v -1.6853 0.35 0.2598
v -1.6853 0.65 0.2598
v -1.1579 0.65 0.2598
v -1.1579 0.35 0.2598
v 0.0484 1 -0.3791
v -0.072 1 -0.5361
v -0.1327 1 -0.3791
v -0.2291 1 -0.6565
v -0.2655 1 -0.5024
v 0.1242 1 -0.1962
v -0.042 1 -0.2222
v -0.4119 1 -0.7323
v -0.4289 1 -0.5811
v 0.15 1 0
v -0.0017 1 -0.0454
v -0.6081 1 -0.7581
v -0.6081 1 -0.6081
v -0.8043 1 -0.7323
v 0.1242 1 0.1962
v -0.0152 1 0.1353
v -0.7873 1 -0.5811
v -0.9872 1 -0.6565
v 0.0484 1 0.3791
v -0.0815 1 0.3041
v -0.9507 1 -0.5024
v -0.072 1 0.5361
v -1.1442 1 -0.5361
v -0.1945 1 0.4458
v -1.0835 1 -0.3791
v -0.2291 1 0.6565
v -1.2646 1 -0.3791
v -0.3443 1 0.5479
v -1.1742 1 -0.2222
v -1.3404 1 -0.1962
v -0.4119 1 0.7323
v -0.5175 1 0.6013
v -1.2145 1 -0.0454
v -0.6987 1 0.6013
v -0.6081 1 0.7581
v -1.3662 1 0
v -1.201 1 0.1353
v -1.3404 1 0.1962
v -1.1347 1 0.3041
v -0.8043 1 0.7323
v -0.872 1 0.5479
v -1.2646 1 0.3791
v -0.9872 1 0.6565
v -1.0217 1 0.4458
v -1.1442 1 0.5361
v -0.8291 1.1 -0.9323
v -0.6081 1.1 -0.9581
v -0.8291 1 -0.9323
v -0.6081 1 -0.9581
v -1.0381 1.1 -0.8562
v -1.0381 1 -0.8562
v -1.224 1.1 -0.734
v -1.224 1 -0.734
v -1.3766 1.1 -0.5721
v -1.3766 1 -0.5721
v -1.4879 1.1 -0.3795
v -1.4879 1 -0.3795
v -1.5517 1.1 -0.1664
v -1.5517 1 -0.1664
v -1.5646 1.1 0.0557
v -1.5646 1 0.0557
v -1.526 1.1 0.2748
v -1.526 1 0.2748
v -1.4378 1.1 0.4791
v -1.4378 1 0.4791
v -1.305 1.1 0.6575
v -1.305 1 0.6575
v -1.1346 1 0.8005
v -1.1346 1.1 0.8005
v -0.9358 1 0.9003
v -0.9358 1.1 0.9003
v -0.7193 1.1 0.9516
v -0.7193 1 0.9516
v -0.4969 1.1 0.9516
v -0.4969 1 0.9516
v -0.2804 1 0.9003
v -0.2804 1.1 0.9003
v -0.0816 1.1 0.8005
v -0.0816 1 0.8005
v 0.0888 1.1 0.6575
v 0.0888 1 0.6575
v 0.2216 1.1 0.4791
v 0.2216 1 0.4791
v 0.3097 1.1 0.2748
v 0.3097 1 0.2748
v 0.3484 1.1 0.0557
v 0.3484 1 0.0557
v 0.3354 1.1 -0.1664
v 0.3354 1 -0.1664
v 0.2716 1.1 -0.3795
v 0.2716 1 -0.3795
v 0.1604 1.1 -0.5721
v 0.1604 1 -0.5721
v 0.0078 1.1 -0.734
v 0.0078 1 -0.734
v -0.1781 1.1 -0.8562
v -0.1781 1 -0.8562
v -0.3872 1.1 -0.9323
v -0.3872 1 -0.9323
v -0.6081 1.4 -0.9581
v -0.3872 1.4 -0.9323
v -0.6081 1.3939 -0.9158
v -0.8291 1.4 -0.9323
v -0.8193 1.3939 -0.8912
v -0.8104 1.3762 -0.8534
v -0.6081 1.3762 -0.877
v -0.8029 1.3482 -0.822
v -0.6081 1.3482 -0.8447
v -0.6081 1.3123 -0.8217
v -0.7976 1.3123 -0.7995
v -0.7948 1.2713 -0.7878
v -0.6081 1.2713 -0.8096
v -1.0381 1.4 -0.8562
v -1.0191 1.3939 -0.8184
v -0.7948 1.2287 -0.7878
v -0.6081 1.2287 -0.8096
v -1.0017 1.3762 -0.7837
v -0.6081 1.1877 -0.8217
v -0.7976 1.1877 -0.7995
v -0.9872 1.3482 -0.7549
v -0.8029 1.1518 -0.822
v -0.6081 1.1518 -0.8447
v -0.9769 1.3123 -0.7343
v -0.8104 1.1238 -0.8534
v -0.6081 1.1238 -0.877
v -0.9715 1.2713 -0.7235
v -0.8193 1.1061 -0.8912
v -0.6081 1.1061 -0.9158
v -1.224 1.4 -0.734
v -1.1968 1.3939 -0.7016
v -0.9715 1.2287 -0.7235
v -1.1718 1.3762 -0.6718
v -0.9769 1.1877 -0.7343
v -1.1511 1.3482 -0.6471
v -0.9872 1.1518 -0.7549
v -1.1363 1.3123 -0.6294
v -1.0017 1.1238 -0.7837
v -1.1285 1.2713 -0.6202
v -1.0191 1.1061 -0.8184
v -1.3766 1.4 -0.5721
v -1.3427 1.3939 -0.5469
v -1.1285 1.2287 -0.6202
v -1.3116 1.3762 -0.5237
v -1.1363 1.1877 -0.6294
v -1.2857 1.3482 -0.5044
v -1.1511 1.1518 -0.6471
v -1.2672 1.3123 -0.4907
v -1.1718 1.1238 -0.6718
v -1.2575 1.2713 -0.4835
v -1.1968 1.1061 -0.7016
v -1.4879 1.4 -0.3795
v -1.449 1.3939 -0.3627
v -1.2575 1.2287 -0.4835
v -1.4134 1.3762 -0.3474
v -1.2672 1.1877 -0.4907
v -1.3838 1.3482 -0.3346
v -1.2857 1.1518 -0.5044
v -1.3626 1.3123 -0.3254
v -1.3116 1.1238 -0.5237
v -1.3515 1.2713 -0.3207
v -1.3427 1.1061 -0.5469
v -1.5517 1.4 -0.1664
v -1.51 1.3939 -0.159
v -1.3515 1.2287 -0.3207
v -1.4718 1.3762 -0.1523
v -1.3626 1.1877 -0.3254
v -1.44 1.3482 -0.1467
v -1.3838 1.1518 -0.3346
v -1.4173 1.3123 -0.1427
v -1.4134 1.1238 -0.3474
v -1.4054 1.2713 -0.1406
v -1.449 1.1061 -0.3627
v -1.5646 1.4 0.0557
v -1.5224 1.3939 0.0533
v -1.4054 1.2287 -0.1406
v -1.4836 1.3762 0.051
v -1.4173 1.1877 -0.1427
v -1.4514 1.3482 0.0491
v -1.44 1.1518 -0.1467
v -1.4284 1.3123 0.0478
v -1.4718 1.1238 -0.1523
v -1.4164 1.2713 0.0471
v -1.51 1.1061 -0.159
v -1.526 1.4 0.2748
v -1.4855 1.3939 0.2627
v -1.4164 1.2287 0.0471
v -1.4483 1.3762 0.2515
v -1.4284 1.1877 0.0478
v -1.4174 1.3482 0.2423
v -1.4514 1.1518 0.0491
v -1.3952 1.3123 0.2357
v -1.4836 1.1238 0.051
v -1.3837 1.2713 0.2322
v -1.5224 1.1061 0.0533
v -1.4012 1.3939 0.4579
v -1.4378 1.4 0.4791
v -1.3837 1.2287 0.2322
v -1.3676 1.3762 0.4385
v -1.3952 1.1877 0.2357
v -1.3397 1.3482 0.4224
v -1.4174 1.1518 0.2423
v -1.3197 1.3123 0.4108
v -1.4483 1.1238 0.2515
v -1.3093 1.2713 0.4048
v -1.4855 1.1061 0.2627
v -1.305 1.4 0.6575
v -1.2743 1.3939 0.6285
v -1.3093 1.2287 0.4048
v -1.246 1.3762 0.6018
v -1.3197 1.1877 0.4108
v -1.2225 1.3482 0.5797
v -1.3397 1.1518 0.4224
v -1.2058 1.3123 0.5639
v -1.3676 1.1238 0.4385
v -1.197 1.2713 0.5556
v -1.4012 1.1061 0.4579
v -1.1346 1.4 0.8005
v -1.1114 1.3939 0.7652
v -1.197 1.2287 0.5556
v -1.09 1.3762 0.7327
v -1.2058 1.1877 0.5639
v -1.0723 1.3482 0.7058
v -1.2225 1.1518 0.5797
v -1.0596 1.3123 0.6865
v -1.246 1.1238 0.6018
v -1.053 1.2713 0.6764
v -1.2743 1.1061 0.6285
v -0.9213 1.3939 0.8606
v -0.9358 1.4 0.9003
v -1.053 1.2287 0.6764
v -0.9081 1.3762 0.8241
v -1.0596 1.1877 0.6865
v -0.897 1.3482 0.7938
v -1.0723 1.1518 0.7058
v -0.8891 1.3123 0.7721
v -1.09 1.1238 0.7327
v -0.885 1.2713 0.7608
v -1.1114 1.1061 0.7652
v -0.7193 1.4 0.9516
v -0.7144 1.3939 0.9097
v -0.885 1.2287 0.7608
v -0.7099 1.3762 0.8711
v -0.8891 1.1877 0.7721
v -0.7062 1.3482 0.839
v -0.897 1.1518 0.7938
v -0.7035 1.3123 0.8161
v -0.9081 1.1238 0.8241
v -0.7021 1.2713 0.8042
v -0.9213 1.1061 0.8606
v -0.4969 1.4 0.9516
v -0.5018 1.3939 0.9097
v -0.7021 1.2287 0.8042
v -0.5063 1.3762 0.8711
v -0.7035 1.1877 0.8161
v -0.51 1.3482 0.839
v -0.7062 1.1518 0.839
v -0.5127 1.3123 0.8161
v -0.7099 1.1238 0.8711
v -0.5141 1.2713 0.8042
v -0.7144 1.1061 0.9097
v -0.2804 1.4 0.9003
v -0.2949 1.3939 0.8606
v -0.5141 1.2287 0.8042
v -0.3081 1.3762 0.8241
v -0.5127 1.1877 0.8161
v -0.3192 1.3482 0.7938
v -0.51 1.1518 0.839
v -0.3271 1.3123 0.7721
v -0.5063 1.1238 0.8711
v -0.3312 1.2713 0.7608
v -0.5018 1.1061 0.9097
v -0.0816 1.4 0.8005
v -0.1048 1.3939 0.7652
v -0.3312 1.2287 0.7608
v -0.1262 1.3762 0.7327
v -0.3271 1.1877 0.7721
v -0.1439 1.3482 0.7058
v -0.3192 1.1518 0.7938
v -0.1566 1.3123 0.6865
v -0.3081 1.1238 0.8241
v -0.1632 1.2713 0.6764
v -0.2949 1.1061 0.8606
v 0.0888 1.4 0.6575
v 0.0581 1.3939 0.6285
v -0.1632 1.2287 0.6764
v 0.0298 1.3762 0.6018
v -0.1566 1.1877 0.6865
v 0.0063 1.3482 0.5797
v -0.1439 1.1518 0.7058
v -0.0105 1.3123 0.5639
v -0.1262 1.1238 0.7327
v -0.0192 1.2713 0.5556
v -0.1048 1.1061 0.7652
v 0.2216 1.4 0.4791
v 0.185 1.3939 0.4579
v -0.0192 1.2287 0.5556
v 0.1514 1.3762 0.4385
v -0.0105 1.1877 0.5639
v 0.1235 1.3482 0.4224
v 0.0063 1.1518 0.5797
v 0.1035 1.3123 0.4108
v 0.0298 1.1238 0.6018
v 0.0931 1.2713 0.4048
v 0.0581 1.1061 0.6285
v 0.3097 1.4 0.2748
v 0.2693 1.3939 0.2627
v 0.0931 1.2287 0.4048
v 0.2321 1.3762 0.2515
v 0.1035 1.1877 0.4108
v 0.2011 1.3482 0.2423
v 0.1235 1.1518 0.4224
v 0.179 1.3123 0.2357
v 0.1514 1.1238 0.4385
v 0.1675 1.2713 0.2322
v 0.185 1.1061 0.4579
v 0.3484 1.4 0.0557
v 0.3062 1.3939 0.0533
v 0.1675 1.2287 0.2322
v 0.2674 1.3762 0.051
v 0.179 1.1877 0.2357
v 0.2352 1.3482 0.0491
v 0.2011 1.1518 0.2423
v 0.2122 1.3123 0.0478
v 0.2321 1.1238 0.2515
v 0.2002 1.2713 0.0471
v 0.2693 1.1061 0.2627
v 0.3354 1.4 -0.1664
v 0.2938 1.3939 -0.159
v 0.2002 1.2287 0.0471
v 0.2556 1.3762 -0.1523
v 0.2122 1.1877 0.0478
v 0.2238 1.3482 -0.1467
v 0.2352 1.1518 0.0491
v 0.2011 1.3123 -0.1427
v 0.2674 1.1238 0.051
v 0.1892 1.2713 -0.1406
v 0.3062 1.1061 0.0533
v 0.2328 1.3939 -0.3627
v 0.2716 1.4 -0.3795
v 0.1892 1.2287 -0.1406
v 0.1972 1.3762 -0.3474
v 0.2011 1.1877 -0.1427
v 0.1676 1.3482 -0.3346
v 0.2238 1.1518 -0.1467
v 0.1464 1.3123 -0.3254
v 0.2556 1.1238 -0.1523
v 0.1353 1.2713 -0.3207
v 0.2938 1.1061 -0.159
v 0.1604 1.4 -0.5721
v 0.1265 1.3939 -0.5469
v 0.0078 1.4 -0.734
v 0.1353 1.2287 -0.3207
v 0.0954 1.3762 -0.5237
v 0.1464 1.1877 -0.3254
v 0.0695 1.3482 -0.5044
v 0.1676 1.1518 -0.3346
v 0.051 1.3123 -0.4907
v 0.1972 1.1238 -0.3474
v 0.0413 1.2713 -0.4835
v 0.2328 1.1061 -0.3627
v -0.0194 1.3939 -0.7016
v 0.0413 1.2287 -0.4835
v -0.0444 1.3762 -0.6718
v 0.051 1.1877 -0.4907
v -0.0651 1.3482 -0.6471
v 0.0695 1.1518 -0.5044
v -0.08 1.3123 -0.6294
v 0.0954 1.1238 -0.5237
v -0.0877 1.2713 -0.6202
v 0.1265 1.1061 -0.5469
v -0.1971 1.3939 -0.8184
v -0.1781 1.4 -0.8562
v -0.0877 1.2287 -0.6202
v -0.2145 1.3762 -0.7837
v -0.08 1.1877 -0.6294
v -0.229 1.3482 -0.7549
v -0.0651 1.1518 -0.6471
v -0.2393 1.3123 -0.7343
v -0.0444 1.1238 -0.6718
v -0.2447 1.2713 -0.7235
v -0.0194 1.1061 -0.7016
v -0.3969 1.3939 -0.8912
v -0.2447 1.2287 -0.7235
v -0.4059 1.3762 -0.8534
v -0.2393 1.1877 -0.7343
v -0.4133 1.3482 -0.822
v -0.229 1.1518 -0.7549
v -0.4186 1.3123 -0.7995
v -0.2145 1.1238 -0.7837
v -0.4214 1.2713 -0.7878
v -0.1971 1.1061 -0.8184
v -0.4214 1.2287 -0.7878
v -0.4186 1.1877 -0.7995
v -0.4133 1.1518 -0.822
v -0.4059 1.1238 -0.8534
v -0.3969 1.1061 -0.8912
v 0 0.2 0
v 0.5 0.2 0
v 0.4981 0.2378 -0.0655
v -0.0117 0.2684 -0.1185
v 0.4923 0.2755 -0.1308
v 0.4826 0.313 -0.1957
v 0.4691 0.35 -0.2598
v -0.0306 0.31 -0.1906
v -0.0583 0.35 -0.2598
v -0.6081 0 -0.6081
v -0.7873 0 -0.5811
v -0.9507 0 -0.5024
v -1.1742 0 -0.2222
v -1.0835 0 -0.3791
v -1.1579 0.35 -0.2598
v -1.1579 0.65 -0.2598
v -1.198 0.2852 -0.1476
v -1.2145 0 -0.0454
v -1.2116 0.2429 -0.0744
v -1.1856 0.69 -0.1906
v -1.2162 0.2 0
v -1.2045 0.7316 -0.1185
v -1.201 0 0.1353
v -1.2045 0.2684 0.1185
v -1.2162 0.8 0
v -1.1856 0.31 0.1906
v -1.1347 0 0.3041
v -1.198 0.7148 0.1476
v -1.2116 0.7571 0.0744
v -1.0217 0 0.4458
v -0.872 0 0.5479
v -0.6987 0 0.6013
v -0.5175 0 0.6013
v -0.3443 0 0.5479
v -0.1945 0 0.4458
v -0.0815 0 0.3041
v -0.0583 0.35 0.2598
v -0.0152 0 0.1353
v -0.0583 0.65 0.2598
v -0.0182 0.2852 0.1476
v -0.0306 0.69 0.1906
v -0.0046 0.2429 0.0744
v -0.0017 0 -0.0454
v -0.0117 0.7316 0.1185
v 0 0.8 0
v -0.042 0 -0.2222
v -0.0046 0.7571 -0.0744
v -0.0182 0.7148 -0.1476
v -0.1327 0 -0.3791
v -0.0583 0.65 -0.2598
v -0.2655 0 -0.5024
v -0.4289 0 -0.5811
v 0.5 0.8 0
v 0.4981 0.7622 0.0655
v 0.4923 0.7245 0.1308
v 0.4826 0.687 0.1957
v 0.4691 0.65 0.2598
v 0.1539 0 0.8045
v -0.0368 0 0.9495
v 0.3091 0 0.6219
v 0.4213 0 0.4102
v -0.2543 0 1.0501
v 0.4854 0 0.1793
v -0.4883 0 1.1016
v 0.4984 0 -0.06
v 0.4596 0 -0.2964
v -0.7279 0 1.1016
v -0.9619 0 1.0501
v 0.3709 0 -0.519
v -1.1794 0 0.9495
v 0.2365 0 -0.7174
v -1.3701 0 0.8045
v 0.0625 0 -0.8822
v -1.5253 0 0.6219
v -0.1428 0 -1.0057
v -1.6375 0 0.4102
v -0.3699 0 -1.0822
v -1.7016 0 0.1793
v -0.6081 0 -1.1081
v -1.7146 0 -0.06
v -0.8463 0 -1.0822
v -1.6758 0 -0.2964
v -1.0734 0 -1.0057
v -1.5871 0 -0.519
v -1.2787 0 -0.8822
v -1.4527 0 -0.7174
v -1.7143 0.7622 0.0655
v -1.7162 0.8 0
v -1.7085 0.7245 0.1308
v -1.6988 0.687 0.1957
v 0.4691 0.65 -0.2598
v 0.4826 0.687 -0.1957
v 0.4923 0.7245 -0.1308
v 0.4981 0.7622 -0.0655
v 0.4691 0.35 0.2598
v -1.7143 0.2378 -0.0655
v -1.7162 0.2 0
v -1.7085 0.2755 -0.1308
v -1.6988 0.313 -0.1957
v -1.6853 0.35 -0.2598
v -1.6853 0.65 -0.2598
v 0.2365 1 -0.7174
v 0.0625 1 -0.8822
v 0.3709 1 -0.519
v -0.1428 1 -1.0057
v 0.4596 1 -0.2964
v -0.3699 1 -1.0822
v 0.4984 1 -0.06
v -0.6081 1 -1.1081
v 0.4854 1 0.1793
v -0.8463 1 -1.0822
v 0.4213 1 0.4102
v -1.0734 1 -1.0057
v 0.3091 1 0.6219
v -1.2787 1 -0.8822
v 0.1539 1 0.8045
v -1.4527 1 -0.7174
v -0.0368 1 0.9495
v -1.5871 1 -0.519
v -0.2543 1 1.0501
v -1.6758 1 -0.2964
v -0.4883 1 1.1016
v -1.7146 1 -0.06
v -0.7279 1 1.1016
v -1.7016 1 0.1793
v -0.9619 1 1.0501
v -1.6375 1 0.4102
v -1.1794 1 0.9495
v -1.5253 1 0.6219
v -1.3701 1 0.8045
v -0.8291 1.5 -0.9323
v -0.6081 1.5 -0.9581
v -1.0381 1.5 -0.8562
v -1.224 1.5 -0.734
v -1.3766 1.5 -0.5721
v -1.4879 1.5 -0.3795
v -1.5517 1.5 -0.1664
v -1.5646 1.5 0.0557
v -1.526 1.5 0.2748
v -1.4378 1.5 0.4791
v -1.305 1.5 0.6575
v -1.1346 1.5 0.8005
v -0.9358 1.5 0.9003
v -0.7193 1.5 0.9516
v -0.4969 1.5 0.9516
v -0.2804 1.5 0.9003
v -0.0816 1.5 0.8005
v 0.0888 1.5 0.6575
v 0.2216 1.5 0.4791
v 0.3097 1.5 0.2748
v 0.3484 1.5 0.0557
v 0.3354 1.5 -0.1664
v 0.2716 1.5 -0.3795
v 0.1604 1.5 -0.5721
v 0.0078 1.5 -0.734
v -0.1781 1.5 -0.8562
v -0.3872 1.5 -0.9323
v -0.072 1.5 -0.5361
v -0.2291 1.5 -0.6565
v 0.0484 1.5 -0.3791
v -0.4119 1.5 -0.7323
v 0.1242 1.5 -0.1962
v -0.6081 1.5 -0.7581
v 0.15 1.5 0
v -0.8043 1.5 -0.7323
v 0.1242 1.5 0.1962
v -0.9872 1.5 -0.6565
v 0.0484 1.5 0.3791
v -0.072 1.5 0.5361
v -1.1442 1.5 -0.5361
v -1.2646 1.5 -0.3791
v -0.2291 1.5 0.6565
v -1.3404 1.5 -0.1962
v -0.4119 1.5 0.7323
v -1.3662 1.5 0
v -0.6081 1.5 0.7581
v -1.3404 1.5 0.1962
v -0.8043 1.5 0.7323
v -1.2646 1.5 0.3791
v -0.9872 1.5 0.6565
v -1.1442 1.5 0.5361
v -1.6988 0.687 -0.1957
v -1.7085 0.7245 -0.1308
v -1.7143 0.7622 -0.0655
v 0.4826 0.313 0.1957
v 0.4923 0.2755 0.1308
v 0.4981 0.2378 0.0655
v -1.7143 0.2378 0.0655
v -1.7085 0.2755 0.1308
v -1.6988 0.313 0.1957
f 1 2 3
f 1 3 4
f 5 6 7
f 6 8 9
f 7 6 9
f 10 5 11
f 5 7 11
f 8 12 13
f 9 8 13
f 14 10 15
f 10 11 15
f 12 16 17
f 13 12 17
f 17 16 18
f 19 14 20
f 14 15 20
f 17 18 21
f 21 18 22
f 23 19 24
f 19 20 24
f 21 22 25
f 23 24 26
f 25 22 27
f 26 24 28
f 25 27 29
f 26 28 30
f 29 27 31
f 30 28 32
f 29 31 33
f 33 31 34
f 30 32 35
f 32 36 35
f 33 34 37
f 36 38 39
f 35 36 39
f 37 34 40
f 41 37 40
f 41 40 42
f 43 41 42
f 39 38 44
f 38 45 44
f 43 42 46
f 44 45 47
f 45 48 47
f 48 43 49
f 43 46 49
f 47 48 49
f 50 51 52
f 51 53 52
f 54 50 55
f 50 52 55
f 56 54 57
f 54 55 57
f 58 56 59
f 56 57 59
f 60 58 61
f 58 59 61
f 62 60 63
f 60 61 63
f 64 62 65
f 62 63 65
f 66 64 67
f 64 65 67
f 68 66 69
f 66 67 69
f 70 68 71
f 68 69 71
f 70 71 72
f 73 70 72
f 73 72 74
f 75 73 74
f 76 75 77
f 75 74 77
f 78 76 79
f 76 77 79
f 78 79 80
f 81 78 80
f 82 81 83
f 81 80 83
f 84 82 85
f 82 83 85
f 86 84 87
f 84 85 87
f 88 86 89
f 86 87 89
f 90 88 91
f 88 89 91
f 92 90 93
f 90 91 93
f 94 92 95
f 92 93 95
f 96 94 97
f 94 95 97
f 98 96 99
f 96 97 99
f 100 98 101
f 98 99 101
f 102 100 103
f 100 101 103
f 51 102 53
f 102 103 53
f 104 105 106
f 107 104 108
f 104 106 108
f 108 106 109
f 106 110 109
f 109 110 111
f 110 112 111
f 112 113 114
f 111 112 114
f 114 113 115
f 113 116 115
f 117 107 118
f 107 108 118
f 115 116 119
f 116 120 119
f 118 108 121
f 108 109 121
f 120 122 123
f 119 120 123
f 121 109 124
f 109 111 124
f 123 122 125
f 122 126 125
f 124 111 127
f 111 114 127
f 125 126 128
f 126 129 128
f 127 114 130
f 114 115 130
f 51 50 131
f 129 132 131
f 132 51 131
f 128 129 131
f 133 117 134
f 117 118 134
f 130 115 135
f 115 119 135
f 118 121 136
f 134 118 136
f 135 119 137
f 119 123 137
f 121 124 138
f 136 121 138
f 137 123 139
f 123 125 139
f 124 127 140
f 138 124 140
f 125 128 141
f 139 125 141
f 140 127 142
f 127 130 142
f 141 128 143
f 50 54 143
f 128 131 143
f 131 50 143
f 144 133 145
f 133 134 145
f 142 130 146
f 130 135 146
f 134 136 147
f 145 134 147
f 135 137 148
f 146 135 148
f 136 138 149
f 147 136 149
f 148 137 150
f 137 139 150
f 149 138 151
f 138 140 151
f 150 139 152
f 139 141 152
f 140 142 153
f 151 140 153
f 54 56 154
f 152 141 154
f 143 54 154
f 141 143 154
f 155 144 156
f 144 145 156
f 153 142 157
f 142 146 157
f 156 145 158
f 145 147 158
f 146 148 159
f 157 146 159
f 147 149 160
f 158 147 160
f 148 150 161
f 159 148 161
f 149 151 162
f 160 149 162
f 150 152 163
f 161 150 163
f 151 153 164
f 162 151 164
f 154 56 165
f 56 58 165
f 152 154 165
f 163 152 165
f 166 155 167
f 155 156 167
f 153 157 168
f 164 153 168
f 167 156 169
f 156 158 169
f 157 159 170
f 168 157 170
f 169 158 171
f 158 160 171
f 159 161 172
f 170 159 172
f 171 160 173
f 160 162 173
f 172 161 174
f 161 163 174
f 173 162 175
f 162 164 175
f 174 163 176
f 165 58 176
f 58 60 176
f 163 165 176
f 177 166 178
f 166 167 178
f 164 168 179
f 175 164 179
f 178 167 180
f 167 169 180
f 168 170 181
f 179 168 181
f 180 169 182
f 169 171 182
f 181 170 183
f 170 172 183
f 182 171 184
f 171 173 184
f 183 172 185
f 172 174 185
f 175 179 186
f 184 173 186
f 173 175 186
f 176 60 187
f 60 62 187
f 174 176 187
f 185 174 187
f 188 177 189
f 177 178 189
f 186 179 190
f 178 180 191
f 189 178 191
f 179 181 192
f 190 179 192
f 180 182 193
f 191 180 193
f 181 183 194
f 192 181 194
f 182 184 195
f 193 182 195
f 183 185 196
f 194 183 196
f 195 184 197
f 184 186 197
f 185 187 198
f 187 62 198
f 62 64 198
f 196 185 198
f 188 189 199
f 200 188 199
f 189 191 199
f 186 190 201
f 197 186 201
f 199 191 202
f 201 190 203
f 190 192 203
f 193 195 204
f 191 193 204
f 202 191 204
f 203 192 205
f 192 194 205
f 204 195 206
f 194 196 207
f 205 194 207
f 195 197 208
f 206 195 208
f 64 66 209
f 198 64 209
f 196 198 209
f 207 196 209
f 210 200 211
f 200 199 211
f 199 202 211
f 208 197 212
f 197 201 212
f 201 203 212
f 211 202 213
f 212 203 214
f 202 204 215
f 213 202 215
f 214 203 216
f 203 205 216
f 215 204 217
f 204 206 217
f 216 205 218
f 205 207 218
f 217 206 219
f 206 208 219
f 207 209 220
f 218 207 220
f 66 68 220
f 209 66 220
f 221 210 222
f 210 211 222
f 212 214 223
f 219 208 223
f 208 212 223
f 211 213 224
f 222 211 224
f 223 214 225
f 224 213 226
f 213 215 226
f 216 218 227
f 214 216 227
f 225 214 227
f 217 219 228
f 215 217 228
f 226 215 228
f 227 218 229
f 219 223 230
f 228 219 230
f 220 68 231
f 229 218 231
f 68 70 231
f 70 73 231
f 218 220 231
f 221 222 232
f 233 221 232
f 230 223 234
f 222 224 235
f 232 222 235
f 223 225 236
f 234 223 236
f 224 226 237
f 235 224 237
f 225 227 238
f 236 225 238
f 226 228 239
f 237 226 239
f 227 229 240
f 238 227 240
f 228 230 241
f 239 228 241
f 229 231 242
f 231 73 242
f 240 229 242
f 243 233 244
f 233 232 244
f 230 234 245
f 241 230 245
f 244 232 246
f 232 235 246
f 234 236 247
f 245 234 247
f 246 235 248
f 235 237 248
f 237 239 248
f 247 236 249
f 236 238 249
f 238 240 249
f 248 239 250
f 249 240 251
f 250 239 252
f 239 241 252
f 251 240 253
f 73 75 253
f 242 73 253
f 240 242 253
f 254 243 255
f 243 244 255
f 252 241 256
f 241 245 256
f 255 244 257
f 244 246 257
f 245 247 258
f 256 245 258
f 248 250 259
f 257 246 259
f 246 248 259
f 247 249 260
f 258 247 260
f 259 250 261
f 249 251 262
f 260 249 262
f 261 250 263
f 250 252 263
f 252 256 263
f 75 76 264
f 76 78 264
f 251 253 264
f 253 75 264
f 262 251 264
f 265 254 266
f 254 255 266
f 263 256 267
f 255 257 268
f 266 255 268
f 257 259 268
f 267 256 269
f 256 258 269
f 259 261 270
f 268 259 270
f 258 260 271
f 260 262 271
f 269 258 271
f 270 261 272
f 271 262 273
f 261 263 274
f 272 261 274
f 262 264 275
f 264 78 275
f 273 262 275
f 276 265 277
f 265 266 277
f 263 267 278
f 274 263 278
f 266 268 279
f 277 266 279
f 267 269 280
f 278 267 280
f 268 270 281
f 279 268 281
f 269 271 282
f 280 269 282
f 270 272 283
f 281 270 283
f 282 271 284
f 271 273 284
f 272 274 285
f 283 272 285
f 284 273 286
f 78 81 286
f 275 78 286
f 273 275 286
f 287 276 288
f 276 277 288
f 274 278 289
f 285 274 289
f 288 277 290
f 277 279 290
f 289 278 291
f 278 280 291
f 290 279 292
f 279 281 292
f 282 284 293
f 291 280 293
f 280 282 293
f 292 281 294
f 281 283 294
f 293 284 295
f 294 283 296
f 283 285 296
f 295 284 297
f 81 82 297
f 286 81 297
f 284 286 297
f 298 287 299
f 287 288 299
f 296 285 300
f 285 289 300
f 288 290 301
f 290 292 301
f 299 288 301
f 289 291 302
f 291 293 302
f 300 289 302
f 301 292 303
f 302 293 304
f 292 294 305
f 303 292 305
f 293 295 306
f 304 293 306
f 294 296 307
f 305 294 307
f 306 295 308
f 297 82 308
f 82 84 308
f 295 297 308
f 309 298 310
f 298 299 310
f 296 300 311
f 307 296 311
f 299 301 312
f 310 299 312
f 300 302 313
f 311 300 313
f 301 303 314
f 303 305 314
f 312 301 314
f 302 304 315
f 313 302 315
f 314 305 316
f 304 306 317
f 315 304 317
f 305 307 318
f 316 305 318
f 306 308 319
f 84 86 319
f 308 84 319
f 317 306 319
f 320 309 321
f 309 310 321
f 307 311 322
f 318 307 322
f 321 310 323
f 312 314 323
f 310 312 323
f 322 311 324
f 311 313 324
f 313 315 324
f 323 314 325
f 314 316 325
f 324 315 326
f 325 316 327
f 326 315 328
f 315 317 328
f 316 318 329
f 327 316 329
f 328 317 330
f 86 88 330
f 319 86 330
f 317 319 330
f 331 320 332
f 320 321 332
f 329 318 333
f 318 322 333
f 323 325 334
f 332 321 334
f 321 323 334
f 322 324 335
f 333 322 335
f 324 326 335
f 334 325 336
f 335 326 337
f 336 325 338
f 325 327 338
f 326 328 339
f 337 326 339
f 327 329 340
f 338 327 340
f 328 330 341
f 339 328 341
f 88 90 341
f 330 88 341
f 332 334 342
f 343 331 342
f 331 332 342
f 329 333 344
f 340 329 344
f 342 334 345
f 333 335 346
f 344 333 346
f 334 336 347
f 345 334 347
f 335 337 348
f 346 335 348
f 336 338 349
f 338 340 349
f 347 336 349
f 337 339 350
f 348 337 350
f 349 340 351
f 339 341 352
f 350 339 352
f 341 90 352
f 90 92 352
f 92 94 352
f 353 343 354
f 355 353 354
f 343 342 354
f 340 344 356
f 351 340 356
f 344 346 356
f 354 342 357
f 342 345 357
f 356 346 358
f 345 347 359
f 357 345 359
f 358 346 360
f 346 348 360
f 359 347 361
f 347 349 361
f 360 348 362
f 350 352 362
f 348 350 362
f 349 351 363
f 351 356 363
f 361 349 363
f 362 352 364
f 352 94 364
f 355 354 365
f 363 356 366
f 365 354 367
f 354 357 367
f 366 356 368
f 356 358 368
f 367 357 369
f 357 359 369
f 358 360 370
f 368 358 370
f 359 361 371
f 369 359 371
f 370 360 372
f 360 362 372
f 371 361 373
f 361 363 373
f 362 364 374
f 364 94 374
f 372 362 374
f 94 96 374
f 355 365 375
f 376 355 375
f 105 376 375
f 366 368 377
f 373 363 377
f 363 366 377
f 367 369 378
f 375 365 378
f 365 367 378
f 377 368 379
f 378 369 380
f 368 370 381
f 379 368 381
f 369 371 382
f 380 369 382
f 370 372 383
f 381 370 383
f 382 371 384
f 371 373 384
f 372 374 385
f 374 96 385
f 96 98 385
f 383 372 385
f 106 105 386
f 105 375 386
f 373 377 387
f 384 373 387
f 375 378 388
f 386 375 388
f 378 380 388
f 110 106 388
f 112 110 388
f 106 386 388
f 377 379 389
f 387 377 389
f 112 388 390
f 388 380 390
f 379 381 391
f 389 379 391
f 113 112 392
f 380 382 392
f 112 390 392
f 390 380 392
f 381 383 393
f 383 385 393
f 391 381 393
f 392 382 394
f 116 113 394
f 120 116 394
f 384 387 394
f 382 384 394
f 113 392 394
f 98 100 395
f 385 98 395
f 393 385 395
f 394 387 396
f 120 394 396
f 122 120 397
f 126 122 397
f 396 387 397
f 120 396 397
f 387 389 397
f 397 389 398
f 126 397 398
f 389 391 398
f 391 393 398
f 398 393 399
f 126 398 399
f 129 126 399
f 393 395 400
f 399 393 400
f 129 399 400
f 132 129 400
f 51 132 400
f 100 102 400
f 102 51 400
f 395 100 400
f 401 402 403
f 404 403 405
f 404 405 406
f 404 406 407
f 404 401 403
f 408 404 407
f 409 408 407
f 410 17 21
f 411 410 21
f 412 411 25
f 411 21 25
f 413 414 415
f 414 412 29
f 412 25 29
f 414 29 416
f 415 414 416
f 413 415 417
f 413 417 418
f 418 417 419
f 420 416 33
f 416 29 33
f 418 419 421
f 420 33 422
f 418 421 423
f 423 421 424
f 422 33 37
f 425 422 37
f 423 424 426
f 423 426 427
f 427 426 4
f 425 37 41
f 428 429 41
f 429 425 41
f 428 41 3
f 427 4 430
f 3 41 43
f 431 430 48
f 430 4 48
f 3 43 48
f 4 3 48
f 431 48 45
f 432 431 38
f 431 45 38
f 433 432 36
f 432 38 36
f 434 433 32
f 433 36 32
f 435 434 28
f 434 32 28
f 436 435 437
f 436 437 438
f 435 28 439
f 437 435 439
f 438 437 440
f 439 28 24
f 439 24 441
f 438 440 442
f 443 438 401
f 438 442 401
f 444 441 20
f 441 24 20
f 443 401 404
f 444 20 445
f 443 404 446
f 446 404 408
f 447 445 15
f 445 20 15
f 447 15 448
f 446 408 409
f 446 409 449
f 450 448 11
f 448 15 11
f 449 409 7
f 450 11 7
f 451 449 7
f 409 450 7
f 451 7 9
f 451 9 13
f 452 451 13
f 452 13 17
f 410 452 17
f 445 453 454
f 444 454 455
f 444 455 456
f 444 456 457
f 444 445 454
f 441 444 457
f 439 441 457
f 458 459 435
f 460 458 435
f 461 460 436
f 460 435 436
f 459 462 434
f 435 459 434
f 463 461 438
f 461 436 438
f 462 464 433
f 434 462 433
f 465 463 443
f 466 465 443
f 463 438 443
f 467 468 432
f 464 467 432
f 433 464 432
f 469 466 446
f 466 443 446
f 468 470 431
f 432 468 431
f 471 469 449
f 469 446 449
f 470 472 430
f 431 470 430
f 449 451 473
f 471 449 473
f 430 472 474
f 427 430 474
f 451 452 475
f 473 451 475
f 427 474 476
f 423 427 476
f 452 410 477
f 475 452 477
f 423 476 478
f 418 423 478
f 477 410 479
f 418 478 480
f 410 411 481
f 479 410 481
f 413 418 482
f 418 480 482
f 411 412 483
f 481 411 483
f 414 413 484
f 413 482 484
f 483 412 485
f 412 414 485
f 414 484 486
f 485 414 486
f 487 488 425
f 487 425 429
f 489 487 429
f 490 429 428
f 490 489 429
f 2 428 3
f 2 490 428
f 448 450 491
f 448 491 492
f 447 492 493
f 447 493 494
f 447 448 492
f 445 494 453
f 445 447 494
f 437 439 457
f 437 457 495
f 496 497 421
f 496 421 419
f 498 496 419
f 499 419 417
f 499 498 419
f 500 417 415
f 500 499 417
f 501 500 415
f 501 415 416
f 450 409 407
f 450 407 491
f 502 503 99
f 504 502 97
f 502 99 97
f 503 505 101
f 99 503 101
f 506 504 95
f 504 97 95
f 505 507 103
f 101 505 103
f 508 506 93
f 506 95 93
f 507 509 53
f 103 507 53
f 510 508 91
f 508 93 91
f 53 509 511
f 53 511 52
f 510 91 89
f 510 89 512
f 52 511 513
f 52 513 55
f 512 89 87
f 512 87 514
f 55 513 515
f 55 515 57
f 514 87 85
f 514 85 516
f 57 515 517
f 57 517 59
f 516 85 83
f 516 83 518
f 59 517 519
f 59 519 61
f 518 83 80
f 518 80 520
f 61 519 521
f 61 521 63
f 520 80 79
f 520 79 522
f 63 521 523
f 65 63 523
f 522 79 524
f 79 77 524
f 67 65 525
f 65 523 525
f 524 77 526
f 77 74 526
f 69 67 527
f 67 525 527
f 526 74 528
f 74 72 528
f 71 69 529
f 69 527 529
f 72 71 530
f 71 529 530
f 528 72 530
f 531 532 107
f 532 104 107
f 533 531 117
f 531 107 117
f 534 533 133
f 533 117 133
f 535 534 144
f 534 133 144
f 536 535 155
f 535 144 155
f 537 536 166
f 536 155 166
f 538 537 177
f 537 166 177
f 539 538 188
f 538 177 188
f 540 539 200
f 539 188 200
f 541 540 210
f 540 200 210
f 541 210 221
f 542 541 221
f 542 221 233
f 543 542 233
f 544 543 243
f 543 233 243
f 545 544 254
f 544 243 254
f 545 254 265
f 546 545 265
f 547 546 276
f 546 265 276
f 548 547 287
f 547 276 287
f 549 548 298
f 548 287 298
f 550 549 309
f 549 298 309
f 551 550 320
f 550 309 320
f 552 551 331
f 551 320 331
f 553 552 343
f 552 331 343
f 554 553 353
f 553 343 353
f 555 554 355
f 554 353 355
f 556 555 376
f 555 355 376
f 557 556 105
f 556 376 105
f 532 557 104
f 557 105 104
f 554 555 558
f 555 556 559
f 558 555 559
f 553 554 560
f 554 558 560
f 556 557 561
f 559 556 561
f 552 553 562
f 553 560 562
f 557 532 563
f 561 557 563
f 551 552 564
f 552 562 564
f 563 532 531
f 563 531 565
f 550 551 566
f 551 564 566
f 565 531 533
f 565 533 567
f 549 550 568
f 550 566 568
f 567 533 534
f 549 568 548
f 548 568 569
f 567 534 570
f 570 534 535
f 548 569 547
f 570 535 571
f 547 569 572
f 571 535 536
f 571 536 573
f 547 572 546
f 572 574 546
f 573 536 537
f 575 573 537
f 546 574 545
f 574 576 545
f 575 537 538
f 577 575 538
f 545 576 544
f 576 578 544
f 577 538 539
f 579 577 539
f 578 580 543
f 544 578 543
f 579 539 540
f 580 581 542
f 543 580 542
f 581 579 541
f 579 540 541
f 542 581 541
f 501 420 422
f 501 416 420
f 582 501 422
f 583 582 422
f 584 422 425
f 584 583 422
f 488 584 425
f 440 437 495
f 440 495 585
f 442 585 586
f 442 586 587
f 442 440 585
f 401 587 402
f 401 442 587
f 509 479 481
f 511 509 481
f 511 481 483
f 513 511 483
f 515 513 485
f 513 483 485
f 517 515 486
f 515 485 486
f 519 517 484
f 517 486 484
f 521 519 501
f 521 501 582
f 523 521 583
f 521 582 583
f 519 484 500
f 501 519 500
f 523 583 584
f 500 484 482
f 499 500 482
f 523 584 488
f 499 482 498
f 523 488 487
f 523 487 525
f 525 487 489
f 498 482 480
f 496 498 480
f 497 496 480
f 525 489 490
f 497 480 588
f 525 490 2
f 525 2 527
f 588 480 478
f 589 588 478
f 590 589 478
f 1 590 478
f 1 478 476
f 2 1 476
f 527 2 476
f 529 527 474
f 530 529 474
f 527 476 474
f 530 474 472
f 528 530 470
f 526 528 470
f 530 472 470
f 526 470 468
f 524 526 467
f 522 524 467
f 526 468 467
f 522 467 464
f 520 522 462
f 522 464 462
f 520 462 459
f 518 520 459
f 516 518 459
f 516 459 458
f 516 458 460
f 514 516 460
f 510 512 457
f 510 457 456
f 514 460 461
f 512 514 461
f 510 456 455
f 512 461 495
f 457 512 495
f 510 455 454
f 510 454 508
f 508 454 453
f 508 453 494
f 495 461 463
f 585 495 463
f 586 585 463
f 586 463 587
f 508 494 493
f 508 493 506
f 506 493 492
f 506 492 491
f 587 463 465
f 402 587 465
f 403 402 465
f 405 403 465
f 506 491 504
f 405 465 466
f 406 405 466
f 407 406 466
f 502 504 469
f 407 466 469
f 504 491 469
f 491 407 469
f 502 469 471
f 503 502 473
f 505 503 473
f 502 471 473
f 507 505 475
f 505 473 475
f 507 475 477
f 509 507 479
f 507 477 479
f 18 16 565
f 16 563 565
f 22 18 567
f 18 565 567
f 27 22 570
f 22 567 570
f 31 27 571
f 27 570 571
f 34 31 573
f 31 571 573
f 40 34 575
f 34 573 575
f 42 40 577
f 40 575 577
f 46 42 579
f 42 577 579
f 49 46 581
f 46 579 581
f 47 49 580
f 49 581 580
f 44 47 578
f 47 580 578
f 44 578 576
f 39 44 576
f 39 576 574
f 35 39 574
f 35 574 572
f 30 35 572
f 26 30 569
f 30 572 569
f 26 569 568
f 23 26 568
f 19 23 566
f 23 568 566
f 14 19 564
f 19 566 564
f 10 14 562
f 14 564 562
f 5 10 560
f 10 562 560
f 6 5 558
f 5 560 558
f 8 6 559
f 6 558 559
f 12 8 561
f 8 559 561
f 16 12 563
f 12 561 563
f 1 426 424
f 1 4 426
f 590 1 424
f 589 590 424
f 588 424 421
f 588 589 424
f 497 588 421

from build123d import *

# Parameters (mm, degrees)
CUT_EXTRUDE1_DEPTH      = 3.534416177
CUT_EXTRUDE1_DEPTH_BACK = 3.534416177


with BuildPart() as part:
    # Sketch3 → Revolve1 (revolve)
    with BuildSketch(Plane.XY, mode=Mode.PRIVATE) as revolve1_sk:
        with BuildLine():
            ThreePointArc((0.35, 1.4), (0.2, 1.25), (0.35, 1.1))
            Line((0.35, 1.1), (0.35, 1))
            Line((0.35, 1), (0.5, 1))
            Line((0.5, 1), (0.5, 0))
            Line((0.5, 0), (0, 0))
            Line((0, 0), (0, 1))
            Line((0, 1), (0.15, 1))
            Line((0.15, 1), (0.15, 1.5))
            Line((0.15, 1.5), (0.35, 1.5))
            Line((0.35, 1.5), (0.35, 1.4))
        make_face()
    revolve(revolve1_sk.sketch.rotate(Axis((-0.608104109, 0, 0), (0, 1, 0)), 90), axis=Axis((-0.608104109, 0, 0), (0, 1, 0)))

    # Sketch11 → Cut-Extrude1 (cut, two sides: drawn at the far end of the back side and taken through both)
    with BuildSketch(Plane(origin=(0, 0, 0), x_dir=(0, 0, -1), z_dir=(1, 0, 0)).offset(-CUT_EXTRUDE1_DEPTH_BACK)):
        Polygon((0, 0.8), (-0.259807621, 0.65), (-0.259807621, 0.35), (0, 0.2), (0.259807621, 0.35), (0.259807621, 0.65), align=None)
    extrude(amount=CUT_EXTRUDE1_DEPTH + CUT_EXTRUDE1_DEPTH_BACK, mode=Mode.SUBTRACT)


solid = part.part
